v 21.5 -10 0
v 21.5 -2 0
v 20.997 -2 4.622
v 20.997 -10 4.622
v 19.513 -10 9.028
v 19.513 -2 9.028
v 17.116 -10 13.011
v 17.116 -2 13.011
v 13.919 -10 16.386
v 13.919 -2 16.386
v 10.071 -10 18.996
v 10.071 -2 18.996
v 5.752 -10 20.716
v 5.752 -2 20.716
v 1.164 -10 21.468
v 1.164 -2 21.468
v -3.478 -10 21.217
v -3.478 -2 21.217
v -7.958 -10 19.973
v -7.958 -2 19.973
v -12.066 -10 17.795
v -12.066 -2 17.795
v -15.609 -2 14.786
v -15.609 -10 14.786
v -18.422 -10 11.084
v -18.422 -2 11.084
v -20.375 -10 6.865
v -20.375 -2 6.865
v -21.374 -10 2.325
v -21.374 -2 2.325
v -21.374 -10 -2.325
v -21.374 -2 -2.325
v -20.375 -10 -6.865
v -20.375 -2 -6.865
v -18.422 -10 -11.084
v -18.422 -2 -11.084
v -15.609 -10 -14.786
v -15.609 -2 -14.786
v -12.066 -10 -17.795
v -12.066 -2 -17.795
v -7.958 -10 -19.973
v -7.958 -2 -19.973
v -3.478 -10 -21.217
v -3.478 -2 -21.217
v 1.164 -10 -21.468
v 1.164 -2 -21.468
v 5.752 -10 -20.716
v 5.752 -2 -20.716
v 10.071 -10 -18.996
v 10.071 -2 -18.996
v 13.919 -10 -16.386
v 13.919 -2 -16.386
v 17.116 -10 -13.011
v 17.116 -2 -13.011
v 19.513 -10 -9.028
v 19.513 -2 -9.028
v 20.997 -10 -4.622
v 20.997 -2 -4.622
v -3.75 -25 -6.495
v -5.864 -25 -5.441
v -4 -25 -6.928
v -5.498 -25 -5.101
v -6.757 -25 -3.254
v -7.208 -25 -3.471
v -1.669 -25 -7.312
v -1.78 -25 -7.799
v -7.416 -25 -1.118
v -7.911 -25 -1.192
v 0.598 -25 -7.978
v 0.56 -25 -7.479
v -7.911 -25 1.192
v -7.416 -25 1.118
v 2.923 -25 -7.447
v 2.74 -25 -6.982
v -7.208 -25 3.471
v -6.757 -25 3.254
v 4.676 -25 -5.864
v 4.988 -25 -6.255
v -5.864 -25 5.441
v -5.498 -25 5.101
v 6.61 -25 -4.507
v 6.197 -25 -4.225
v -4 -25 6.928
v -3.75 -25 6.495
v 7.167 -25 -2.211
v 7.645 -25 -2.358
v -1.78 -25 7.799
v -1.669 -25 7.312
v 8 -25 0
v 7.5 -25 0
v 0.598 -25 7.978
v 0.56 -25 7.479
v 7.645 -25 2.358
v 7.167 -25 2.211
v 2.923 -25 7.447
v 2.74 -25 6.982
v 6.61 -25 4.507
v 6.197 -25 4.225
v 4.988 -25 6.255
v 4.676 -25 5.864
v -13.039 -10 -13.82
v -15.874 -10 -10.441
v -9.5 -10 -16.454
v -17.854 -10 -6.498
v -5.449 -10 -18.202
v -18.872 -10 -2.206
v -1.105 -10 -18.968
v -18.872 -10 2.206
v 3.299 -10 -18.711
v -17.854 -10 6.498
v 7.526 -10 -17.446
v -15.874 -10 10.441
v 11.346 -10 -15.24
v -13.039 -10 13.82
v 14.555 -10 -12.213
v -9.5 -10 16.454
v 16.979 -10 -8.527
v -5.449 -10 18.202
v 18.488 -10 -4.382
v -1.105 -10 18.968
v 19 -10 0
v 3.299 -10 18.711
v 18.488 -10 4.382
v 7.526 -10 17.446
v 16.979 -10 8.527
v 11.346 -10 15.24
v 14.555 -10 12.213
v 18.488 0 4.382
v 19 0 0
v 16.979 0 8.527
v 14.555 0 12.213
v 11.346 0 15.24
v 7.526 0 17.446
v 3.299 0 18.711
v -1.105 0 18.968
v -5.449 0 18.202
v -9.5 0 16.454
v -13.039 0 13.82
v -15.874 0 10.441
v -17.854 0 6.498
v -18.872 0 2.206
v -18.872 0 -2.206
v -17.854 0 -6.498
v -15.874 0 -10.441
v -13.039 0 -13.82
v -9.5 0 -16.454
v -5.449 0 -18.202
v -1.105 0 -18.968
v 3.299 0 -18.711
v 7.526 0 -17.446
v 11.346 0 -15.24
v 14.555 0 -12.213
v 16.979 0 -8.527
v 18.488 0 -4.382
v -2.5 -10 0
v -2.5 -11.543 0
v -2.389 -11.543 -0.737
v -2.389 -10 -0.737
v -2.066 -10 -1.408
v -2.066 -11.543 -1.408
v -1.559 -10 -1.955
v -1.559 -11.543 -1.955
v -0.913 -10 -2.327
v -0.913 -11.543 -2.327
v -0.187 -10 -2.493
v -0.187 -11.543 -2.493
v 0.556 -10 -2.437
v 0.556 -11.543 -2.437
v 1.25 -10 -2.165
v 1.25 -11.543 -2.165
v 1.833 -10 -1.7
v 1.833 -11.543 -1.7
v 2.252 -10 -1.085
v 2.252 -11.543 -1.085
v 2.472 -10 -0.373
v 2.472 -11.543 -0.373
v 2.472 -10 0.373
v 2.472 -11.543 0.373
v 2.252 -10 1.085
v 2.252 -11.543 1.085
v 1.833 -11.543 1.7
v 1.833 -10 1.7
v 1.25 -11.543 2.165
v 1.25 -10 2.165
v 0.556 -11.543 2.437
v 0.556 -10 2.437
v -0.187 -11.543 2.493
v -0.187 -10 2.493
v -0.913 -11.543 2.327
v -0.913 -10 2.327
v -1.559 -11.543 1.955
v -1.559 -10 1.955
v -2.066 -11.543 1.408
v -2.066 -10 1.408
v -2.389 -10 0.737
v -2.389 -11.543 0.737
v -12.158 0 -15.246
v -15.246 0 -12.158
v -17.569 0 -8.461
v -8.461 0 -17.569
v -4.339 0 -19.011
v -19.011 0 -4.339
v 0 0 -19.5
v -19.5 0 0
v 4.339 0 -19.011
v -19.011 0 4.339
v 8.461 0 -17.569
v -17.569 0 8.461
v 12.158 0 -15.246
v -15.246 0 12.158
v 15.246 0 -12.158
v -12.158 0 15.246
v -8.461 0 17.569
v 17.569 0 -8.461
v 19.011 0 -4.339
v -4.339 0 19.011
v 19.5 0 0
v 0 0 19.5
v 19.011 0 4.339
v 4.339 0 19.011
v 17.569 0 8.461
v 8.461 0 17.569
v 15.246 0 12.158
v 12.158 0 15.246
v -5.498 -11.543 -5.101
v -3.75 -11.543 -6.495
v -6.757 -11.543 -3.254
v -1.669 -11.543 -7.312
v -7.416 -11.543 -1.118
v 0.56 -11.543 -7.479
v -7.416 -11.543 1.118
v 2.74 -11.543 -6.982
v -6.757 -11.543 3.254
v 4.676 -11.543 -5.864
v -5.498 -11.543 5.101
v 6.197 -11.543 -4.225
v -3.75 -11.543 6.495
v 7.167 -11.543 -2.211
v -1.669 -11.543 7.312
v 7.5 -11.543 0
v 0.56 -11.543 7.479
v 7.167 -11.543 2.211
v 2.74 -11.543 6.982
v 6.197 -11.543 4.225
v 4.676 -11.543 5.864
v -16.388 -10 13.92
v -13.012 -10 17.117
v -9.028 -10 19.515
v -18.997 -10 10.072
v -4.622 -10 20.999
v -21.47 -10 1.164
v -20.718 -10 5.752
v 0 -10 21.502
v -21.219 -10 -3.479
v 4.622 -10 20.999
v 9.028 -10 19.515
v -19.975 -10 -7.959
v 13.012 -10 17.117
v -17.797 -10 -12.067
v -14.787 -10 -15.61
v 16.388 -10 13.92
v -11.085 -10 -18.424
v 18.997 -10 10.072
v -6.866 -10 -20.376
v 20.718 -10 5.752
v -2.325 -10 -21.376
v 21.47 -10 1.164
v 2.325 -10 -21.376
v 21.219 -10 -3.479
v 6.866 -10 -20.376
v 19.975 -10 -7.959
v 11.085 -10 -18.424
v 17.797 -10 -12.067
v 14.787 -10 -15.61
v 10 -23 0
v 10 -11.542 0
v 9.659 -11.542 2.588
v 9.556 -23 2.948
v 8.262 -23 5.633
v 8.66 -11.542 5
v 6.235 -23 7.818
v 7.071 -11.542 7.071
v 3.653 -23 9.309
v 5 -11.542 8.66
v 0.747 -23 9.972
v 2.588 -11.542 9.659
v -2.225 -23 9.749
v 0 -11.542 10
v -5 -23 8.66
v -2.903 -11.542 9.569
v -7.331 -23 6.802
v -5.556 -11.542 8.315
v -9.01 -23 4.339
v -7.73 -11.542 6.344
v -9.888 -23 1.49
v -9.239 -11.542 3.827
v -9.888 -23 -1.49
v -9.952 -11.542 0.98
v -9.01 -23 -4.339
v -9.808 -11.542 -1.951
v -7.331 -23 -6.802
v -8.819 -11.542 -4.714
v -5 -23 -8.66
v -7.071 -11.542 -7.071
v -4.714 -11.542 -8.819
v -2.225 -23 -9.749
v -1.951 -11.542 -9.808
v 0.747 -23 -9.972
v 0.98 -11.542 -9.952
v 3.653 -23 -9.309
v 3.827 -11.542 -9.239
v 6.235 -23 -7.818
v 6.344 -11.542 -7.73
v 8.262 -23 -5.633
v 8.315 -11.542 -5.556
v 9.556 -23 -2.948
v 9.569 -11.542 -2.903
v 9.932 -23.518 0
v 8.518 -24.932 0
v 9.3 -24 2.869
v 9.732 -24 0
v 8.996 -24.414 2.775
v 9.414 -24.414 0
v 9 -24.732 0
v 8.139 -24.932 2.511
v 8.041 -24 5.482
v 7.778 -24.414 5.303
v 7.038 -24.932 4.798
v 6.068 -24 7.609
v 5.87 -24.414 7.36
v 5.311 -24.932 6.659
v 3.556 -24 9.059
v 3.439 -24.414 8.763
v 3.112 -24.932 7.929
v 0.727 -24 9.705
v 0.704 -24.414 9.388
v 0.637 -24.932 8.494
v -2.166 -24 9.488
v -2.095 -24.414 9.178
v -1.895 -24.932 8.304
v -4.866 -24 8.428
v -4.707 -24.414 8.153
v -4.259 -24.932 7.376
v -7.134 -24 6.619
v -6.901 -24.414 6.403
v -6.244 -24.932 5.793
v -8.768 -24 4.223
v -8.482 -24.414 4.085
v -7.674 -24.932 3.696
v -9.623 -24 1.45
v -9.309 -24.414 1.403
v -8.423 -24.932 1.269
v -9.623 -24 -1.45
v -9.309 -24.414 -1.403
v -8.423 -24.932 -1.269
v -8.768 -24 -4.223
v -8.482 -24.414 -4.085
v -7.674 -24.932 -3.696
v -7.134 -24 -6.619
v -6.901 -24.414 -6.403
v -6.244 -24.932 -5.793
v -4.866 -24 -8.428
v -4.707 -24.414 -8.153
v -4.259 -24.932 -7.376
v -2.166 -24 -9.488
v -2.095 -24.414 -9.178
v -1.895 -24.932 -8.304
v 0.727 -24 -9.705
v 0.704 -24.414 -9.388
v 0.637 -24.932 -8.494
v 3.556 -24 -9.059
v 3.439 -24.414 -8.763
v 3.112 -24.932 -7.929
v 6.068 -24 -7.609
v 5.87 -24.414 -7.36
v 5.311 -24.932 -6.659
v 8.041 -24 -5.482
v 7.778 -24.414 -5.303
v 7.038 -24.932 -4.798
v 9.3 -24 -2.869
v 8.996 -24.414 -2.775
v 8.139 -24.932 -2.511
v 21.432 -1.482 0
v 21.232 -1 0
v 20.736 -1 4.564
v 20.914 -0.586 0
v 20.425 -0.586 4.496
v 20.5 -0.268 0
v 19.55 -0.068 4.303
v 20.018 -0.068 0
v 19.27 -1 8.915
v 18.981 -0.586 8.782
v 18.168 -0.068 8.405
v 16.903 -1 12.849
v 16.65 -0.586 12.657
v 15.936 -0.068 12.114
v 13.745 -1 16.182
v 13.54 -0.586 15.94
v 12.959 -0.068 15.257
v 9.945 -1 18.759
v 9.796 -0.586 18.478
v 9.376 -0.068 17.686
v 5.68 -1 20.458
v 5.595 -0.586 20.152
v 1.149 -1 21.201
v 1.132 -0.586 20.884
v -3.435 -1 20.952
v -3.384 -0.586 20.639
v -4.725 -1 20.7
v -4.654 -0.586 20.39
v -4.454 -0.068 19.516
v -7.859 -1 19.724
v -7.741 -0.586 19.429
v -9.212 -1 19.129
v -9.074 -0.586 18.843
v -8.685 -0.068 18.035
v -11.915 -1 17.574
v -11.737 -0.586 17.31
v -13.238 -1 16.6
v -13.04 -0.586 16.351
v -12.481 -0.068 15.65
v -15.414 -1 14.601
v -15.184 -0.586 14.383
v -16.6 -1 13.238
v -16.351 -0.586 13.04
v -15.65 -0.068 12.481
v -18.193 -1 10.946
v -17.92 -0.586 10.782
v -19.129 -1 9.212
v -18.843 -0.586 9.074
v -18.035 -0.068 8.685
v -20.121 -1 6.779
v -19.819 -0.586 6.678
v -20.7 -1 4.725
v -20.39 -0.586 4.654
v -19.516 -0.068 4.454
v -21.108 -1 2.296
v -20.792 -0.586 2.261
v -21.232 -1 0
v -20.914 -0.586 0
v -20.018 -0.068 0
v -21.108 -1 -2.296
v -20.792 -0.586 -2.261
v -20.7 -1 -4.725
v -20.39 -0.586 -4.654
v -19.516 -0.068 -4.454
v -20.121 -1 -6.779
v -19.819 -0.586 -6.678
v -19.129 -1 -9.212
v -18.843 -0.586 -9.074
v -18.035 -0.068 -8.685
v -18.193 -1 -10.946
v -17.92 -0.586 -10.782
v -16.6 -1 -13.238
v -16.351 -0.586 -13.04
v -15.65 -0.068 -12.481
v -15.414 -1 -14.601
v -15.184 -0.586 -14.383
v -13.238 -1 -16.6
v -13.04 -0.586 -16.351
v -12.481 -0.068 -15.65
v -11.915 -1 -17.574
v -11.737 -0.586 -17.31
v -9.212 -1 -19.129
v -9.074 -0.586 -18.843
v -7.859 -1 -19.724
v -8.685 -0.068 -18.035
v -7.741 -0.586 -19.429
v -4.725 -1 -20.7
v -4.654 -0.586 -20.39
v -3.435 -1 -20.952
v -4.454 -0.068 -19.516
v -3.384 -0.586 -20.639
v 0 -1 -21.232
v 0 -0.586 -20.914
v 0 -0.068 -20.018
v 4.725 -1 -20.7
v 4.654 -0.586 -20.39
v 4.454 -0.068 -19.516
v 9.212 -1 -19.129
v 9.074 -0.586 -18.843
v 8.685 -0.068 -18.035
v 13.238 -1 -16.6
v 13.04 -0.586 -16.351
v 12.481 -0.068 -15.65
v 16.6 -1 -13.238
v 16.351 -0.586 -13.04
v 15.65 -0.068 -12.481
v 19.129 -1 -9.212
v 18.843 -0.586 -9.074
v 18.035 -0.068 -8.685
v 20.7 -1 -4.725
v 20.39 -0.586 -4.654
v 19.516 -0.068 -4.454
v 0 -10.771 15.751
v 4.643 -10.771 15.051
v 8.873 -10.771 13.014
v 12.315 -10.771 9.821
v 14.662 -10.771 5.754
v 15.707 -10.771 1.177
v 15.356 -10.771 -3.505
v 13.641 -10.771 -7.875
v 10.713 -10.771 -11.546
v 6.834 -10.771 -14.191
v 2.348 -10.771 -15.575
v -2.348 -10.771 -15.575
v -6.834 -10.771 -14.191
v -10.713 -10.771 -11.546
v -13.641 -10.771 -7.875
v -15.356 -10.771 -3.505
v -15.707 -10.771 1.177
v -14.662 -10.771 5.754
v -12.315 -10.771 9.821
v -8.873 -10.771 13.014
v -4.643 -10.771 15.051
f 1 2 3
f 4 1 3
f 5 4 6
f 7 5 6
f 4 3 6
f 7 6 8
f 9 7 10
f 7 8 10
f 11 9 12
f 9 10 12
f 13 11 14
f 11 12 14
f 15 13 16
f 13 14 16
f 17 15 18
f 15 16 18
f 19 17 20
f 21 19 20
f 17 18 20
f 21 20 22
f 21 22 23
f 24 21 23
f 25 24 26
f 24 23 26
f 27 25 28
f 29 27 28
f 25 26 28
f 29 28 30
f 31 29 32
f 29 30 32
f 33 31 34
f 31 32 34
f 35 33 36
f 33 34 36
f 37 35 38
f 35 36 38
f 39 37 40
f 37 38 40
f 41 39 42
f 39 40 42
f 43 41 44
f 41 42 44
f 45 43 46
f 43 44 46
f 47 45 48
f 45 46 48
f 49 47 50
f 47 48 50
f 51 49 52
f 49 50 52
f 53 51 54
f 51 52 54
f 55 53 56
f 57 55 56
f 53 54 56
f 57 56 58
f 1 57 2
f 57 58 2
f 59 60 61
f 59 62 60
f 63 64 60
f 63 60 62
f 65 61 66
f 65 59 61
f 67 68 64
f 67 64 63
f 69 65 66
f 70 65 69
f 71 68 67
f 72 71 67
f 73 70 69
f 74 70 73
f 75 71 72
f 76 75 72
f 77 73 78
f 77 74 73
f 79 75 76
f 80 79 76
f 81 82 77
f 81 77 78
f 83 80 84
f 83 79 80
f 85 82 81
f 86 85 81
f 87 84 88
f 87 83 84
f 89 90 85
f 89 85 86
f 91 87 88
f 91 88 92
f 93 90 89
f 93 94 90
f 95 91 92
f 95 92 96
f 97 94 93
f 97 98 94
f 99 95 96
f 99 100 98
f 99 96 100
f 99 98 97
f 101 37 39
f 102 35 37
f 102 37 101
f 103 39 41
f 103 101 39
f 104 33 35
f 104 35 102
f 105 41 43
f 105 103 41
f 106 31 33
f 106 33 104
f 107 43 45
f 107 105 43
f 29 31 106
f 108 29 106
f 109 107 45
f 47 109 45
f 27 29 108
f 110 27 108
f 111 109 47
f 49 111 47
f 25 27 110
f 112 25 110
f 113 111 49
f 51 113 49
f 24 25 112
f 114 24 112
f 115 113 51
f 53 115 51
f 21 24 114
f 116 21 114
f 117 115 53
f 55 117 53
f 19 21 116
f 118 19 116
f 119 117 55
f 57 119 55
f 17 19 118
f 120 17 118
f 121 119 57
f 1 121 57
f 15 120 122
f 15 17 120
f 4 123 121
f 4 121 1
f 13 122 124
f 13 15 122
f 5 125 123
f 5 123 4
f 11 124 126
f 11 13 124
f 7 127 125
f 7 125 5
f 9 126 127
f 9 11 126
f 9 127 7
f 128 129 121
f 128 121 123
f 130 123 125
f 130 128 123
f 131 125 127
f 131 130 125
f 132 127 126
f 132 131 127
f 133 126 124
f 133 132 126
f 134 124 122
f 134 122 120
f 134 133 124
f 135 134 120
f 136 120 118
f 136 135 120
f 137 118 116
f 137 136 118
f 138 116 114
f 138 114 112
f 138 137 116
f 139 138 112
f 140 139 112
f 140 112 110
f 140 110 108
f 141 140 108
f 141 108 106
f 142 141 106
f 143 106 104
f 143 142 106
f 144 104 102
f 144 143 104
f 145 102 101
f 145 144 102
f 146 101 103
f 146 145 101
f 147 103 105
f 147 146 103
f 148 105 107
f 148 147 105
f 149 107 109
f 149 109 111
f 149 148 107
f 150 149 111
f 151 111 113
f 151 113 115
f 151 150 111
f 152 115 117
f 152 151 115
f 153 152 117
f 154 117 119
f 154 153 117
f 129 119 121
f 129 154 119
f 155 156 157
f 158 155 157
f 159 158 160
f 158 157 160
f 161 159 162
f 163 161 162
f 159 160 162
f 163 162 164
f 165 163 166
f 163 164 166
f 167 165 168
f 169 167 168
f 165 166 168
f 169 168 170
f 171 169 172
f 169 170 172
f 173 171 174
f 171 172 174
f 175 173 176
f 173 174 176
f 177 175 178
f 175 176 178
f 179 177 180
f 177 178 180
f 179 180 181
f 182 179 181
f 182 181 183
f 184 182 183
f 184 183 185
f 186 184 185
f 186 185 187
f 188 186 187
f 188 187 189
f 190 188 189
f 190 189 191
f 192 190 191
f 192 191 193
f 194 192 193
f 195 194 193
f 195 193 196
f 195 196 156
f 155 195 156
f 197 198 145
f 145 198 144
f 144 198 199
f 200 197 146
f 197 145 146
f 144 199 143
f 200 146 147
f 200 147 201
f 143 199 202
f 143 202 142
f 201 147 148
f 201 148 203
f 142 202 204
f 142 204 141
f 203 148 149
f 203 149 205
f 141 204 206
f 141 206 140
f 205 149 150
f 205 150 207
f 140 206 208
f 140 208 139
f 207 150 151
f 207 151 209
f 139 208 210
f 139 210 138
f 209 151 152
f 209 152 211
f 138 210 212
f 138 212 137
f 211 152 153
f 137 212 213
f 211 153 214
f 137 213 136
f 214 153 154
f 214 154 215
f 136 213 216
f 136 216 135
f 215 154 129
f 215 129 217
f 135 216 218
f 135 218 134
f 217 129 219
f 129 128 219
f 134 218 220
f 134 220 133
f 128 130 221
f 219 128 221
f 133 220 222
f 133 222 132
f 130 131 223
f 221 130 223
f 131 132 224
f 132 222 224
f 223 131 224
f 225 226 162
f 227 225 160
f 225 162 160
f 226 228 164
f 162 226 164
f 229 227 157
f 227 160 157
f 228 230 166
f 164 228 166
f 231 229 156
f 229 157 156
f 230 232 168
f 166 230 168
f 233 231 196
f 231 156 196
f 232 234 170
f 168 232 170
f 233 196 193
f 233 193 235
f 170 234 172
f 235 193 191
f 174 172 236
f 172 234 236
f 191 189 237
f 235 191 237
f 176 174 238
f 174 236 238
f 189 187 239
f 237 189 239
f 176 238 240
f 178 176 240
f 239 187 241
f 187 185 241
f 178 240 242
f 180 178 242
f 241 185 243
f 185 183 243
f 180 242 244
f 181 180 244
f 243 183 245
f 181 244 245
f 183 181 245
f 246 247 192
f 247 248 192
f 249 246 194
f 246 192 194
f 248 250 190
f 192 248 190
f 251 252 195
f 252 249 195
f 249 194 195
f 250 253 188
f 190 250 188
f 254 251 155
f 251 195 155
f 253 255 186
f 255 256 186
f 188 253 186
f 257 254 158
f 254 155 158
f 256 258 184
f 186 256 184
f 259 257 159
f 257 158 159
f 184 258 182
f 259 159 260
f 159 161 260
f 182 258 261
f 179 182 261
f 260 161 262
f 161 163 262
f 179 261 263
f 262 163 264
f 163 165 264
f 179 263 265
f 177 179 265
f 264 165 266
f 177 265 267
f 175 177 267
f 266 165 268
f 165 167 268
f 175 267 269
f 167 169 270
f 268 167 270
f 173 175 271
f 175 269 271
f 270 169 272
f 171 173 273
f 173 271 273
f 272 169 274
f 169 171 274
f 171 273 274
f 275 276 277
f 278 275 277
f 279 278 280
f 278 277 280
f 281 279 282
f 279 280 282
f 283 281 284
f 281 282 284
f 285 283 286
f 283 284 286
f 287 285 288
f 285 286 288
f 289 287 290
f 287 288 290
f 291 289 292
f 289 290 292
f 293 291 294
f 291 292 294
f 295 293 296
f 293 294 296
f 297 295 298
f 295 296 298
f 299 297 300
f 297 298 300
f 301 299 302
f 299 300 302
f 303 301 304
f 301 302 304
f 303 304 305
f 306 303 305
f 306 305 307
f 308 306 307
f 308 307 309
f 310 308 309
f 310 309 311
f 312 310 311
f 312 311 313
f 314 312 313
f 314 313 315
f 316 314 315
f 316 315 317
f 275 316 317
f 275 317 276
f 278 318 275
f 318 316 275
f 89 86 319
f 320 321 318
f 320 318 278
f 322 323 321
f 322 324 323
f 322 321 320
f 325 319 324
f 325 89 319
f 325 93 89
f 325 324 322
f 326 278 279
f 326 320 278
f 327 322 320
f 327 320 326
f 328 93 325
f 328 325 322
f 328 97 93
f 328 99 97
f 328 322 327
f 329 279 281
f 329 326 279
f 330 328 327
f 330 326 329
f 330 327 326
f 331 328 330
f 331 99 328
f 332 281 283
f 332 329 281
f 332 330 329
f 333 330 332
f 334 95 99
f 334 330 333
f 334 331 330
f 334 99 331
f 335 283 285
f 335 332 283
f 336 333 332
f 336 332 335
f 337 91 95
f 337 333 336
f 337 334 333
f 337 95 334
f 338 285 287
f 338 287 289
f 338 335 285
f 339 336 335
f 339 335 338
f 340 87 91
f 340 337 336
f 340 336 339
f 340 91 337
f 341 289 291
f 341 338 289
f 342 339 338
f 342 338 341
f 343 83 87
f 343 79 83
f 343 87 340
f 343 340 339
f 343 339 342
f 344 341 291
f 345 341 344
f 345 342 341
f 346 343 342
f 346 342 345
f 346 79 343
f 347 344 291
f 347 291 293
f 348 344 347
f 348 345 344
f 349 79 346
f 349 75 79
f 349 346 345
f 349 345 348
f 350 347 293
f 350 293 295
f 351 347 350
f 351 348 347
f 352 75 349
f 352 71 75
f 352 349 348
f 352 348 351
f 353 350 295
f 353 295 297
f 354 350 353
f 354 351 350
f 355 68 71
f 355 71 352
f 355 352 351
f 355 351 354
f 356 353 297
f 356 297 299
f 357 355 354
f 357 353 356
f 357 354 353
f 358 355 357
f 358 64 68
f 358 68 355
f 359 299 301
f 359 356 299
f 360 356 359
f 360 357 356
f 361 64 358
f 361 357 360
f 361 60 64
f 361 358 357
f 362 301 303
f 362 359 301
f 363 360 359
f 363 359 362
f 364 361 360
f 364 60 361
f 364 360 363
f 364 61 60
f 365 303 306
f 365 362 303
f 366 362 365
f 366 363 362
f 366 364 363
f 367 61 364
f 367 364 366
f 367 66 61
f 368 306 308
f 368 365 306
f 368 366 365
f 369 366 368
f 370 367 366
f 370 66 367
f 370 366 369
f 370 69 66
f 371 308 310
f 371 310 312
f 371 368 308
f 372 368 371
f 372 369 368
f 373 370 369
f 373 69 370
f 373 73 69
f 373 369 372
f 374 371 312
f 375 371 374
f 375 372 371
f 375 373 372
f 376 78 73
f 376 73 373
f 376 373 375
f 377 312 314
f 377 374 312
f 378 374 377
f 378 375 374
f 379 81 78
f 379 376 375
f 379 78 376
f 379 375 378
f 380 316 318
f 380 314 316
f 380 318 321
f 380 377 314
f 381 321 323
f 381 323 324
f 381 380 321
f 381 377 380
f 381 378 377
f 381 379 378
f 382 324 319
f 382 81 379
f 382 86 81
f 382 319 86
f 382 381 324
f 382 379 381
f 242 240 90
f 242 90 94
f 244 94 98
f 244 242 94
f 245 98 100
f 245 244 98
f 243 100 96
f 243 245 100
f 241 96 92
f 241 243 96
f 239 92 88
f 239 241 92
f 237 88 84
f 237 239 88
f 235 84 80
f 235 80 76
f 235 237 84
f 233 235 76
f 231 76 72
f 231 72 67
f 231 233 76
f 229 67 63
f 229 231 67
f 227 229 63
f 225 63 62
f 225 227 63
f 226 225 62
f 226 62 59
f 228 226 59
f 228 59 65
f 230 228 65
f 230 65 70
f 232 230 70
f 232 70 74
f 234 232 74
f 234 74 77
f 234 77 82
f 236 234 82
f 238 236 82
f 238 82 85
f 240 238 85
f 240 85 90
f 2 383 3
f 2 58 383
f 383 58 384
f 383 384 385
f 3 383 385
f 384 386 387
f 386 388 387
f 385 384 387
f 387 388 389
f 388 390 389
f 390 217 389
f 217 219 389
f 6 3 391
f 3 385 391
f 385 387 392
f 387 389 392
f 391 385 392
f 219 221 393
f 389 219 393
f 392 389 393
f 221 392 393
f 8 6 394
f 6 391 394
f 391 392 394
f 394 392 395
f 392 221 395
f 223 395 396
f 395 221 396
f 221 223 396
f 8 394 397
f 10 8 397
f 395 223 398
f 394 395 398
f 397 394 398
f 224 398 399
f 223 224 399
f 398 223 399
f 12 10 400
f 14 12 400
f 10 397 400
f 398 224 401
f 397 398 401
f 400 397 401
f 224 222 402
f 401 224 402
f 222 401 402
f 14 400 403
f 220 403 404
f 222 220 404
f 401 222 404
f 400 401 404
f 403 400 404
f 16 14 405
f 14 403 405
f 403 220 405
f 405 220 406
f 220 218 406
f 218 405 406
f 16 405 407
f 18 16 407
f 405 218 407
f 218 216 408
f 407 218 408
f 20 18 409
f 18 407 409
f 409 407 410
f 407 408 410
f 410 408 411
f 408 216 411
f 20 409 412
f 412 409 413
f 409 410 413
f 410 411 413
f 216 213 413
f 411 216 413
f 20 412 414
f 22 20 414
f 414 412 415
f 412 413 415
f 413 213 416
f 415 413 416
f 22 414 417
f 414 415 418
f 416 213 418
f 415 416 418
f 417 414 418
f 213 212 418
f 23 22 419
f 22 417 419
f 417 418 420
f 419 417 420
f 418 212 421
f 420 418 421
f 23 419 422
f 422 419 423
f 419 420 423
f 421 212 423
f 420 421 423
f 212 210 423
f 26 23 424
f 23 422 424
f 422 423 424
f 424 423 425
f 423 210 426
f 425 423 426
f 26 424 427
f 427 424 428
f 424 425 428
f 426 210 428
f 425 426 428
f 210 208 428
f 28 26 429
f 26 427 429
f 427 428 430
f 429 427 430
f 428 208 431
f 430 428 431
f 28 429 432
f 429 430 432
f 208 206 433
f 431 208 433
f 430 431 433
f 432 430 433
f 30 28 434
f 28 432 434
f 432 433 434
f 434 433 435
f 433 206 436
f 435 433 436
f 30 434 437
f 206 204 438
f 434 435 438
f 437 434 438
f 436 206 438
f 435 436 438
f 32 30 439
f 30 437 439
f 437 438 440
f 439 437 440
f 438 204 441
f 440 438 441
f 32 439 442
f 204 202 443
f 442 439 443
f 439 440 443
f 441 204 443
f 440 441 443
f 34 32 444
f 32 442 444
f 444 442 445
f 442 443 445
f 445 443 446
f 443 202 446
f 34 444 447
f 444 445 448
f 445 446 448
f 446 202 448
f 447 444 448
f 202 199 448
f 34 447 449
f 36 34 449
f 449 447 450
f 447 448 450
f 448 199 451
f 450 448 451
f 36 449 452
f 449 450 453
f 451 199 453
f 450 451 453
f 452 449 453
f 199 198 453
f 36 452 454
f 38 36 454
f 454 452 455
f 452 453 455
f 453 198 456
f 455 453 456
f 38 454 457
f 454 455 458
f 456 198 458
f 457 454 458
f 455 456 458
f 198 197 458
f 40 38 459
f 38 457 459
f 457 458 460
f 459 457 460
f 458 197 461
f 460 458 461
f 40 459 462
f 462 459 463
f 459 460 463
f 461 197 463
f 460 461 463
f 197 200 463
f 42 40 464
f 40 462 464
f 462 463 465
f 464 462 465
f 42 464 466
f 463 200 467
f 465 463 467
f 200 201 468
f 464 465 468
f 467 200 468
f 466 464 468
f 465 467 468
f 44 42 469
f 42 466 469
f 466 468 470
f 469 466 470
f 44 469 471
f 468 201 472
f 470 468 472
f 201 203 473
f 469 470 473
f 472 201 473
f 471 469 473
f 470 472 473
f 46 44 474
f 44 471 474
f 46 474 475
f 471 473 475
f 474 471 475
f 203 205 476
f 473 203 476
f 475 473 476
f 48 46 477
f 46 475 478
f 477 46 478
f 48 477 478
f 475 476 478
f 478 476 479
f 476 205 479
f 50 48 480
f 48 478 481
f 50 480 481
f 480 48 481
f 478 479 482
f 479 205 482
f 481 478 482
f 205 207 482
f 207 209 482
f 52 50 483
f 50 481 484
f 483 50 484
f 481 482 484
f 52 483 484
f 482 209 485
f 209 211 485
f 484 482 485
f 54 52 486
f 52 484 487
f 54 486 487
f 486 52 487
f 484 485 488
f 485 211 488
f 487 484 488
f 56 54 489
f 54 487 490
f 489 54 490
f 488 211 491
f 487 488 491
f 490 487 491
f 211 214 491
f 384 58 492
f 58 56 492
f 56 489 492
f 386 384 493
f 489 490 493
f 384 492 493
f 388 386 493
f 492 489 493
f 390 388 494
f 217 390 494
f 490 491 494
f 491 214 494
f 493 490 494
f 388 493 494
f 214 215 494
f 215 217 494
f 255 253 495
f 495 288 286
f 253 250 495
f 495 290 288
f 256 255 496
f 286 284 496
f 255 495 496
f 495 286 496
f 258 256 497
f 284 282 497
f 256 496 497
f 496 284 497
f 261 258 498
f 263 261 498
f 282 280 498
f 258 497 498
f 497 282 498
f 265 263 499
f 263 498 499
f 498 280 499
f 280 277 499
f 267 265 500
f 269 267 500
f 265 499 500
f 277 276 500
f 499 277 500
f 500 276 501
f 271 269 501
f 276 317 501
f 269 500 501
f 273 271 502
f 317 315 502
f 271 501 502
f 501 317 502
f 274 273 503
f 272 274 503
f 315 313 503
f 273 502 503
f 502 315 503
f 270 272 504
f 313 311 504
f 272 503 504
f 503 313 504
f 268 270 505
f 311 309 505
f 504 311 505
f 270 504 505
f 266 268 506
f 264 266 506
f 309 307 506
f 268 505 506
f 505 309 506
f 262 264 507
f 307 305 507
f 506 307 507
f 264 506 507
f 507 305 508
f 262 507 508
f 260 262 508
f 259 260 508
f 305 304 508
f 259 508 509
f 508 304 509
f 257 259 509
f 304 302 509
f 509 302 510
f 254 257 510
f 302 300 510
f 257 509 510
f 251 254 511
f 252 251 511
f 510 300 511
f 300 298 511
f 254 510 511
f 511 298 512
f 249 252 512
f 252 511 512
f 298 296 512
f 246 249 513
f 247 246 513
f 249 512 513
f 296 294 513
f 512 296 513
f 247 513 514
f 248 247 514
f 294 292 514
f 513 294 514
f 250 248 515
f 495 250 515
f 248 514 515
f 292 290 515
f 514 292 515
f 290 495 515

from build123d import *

# Parameters (mm, degrees)
F0_R     = 21.5
F0_R_2   = 19
F1_DEPTH = 10
F5_R     = 10
F5_R_2   = 7.5
F6_DEPTH = 15
F8_D     = 5
F8_DEPTH = 50.8
F9_R     = 2
F10_R    = 2


with BuildPart() as f1:
    # F0 (on Front) → F1 (new body)
    with BuildSketch(Plane.XZ):
        Circle(F0_R)
        Circle(F0_R_2, mode=Mode.SUBTRACT)
    extrude(amount=F1_DEPTH)

    # F9
    f9_edges = [f1.edges().sort_by_distance(p)[0] for p in [
        (-21.5, 0, 0),
    ]]
    fillet(f9_edges, radius=F9_R)


with BuildPart() as f4:
    # F3 (on Right) → F4 (revolve)
    with BuildSketch(Plane.YZ):
        Polygon((-11.54314, 0), (-9.999976, 0), (-9.999976, 21.501865), (-11.54314, 9.994091), align=None)
    revolve(axis=Axis((0, -10.771558, 0), (0, 1, 0)))

    # F5 (on offset) → F6 (join)
    with BuildSketch(Plane.XZ.offset(10)):
        Circle(F5_R)
        Circle(F5_R_2, mode=Mode.SUBTRACT)
    extrude(amount=F6_DEPTH)

    # F8
    with Locations(Plane(origin=(0, 0, 0), x_dir=(1, 0, 0), z_dir=(0, 1, 0))):
        with Locations((0, 0)):
            Hole(F8_D / 2, depth=F8_DEPTH)

    # F10
    f10_edges = [f4.edges().sort_by_distance(p)[0] for p in [
        (-10, -25, 0),
    ]]
    fillet(f10_edges, radius=F10_R)


solid = Compound([f1.part, f4.part])
